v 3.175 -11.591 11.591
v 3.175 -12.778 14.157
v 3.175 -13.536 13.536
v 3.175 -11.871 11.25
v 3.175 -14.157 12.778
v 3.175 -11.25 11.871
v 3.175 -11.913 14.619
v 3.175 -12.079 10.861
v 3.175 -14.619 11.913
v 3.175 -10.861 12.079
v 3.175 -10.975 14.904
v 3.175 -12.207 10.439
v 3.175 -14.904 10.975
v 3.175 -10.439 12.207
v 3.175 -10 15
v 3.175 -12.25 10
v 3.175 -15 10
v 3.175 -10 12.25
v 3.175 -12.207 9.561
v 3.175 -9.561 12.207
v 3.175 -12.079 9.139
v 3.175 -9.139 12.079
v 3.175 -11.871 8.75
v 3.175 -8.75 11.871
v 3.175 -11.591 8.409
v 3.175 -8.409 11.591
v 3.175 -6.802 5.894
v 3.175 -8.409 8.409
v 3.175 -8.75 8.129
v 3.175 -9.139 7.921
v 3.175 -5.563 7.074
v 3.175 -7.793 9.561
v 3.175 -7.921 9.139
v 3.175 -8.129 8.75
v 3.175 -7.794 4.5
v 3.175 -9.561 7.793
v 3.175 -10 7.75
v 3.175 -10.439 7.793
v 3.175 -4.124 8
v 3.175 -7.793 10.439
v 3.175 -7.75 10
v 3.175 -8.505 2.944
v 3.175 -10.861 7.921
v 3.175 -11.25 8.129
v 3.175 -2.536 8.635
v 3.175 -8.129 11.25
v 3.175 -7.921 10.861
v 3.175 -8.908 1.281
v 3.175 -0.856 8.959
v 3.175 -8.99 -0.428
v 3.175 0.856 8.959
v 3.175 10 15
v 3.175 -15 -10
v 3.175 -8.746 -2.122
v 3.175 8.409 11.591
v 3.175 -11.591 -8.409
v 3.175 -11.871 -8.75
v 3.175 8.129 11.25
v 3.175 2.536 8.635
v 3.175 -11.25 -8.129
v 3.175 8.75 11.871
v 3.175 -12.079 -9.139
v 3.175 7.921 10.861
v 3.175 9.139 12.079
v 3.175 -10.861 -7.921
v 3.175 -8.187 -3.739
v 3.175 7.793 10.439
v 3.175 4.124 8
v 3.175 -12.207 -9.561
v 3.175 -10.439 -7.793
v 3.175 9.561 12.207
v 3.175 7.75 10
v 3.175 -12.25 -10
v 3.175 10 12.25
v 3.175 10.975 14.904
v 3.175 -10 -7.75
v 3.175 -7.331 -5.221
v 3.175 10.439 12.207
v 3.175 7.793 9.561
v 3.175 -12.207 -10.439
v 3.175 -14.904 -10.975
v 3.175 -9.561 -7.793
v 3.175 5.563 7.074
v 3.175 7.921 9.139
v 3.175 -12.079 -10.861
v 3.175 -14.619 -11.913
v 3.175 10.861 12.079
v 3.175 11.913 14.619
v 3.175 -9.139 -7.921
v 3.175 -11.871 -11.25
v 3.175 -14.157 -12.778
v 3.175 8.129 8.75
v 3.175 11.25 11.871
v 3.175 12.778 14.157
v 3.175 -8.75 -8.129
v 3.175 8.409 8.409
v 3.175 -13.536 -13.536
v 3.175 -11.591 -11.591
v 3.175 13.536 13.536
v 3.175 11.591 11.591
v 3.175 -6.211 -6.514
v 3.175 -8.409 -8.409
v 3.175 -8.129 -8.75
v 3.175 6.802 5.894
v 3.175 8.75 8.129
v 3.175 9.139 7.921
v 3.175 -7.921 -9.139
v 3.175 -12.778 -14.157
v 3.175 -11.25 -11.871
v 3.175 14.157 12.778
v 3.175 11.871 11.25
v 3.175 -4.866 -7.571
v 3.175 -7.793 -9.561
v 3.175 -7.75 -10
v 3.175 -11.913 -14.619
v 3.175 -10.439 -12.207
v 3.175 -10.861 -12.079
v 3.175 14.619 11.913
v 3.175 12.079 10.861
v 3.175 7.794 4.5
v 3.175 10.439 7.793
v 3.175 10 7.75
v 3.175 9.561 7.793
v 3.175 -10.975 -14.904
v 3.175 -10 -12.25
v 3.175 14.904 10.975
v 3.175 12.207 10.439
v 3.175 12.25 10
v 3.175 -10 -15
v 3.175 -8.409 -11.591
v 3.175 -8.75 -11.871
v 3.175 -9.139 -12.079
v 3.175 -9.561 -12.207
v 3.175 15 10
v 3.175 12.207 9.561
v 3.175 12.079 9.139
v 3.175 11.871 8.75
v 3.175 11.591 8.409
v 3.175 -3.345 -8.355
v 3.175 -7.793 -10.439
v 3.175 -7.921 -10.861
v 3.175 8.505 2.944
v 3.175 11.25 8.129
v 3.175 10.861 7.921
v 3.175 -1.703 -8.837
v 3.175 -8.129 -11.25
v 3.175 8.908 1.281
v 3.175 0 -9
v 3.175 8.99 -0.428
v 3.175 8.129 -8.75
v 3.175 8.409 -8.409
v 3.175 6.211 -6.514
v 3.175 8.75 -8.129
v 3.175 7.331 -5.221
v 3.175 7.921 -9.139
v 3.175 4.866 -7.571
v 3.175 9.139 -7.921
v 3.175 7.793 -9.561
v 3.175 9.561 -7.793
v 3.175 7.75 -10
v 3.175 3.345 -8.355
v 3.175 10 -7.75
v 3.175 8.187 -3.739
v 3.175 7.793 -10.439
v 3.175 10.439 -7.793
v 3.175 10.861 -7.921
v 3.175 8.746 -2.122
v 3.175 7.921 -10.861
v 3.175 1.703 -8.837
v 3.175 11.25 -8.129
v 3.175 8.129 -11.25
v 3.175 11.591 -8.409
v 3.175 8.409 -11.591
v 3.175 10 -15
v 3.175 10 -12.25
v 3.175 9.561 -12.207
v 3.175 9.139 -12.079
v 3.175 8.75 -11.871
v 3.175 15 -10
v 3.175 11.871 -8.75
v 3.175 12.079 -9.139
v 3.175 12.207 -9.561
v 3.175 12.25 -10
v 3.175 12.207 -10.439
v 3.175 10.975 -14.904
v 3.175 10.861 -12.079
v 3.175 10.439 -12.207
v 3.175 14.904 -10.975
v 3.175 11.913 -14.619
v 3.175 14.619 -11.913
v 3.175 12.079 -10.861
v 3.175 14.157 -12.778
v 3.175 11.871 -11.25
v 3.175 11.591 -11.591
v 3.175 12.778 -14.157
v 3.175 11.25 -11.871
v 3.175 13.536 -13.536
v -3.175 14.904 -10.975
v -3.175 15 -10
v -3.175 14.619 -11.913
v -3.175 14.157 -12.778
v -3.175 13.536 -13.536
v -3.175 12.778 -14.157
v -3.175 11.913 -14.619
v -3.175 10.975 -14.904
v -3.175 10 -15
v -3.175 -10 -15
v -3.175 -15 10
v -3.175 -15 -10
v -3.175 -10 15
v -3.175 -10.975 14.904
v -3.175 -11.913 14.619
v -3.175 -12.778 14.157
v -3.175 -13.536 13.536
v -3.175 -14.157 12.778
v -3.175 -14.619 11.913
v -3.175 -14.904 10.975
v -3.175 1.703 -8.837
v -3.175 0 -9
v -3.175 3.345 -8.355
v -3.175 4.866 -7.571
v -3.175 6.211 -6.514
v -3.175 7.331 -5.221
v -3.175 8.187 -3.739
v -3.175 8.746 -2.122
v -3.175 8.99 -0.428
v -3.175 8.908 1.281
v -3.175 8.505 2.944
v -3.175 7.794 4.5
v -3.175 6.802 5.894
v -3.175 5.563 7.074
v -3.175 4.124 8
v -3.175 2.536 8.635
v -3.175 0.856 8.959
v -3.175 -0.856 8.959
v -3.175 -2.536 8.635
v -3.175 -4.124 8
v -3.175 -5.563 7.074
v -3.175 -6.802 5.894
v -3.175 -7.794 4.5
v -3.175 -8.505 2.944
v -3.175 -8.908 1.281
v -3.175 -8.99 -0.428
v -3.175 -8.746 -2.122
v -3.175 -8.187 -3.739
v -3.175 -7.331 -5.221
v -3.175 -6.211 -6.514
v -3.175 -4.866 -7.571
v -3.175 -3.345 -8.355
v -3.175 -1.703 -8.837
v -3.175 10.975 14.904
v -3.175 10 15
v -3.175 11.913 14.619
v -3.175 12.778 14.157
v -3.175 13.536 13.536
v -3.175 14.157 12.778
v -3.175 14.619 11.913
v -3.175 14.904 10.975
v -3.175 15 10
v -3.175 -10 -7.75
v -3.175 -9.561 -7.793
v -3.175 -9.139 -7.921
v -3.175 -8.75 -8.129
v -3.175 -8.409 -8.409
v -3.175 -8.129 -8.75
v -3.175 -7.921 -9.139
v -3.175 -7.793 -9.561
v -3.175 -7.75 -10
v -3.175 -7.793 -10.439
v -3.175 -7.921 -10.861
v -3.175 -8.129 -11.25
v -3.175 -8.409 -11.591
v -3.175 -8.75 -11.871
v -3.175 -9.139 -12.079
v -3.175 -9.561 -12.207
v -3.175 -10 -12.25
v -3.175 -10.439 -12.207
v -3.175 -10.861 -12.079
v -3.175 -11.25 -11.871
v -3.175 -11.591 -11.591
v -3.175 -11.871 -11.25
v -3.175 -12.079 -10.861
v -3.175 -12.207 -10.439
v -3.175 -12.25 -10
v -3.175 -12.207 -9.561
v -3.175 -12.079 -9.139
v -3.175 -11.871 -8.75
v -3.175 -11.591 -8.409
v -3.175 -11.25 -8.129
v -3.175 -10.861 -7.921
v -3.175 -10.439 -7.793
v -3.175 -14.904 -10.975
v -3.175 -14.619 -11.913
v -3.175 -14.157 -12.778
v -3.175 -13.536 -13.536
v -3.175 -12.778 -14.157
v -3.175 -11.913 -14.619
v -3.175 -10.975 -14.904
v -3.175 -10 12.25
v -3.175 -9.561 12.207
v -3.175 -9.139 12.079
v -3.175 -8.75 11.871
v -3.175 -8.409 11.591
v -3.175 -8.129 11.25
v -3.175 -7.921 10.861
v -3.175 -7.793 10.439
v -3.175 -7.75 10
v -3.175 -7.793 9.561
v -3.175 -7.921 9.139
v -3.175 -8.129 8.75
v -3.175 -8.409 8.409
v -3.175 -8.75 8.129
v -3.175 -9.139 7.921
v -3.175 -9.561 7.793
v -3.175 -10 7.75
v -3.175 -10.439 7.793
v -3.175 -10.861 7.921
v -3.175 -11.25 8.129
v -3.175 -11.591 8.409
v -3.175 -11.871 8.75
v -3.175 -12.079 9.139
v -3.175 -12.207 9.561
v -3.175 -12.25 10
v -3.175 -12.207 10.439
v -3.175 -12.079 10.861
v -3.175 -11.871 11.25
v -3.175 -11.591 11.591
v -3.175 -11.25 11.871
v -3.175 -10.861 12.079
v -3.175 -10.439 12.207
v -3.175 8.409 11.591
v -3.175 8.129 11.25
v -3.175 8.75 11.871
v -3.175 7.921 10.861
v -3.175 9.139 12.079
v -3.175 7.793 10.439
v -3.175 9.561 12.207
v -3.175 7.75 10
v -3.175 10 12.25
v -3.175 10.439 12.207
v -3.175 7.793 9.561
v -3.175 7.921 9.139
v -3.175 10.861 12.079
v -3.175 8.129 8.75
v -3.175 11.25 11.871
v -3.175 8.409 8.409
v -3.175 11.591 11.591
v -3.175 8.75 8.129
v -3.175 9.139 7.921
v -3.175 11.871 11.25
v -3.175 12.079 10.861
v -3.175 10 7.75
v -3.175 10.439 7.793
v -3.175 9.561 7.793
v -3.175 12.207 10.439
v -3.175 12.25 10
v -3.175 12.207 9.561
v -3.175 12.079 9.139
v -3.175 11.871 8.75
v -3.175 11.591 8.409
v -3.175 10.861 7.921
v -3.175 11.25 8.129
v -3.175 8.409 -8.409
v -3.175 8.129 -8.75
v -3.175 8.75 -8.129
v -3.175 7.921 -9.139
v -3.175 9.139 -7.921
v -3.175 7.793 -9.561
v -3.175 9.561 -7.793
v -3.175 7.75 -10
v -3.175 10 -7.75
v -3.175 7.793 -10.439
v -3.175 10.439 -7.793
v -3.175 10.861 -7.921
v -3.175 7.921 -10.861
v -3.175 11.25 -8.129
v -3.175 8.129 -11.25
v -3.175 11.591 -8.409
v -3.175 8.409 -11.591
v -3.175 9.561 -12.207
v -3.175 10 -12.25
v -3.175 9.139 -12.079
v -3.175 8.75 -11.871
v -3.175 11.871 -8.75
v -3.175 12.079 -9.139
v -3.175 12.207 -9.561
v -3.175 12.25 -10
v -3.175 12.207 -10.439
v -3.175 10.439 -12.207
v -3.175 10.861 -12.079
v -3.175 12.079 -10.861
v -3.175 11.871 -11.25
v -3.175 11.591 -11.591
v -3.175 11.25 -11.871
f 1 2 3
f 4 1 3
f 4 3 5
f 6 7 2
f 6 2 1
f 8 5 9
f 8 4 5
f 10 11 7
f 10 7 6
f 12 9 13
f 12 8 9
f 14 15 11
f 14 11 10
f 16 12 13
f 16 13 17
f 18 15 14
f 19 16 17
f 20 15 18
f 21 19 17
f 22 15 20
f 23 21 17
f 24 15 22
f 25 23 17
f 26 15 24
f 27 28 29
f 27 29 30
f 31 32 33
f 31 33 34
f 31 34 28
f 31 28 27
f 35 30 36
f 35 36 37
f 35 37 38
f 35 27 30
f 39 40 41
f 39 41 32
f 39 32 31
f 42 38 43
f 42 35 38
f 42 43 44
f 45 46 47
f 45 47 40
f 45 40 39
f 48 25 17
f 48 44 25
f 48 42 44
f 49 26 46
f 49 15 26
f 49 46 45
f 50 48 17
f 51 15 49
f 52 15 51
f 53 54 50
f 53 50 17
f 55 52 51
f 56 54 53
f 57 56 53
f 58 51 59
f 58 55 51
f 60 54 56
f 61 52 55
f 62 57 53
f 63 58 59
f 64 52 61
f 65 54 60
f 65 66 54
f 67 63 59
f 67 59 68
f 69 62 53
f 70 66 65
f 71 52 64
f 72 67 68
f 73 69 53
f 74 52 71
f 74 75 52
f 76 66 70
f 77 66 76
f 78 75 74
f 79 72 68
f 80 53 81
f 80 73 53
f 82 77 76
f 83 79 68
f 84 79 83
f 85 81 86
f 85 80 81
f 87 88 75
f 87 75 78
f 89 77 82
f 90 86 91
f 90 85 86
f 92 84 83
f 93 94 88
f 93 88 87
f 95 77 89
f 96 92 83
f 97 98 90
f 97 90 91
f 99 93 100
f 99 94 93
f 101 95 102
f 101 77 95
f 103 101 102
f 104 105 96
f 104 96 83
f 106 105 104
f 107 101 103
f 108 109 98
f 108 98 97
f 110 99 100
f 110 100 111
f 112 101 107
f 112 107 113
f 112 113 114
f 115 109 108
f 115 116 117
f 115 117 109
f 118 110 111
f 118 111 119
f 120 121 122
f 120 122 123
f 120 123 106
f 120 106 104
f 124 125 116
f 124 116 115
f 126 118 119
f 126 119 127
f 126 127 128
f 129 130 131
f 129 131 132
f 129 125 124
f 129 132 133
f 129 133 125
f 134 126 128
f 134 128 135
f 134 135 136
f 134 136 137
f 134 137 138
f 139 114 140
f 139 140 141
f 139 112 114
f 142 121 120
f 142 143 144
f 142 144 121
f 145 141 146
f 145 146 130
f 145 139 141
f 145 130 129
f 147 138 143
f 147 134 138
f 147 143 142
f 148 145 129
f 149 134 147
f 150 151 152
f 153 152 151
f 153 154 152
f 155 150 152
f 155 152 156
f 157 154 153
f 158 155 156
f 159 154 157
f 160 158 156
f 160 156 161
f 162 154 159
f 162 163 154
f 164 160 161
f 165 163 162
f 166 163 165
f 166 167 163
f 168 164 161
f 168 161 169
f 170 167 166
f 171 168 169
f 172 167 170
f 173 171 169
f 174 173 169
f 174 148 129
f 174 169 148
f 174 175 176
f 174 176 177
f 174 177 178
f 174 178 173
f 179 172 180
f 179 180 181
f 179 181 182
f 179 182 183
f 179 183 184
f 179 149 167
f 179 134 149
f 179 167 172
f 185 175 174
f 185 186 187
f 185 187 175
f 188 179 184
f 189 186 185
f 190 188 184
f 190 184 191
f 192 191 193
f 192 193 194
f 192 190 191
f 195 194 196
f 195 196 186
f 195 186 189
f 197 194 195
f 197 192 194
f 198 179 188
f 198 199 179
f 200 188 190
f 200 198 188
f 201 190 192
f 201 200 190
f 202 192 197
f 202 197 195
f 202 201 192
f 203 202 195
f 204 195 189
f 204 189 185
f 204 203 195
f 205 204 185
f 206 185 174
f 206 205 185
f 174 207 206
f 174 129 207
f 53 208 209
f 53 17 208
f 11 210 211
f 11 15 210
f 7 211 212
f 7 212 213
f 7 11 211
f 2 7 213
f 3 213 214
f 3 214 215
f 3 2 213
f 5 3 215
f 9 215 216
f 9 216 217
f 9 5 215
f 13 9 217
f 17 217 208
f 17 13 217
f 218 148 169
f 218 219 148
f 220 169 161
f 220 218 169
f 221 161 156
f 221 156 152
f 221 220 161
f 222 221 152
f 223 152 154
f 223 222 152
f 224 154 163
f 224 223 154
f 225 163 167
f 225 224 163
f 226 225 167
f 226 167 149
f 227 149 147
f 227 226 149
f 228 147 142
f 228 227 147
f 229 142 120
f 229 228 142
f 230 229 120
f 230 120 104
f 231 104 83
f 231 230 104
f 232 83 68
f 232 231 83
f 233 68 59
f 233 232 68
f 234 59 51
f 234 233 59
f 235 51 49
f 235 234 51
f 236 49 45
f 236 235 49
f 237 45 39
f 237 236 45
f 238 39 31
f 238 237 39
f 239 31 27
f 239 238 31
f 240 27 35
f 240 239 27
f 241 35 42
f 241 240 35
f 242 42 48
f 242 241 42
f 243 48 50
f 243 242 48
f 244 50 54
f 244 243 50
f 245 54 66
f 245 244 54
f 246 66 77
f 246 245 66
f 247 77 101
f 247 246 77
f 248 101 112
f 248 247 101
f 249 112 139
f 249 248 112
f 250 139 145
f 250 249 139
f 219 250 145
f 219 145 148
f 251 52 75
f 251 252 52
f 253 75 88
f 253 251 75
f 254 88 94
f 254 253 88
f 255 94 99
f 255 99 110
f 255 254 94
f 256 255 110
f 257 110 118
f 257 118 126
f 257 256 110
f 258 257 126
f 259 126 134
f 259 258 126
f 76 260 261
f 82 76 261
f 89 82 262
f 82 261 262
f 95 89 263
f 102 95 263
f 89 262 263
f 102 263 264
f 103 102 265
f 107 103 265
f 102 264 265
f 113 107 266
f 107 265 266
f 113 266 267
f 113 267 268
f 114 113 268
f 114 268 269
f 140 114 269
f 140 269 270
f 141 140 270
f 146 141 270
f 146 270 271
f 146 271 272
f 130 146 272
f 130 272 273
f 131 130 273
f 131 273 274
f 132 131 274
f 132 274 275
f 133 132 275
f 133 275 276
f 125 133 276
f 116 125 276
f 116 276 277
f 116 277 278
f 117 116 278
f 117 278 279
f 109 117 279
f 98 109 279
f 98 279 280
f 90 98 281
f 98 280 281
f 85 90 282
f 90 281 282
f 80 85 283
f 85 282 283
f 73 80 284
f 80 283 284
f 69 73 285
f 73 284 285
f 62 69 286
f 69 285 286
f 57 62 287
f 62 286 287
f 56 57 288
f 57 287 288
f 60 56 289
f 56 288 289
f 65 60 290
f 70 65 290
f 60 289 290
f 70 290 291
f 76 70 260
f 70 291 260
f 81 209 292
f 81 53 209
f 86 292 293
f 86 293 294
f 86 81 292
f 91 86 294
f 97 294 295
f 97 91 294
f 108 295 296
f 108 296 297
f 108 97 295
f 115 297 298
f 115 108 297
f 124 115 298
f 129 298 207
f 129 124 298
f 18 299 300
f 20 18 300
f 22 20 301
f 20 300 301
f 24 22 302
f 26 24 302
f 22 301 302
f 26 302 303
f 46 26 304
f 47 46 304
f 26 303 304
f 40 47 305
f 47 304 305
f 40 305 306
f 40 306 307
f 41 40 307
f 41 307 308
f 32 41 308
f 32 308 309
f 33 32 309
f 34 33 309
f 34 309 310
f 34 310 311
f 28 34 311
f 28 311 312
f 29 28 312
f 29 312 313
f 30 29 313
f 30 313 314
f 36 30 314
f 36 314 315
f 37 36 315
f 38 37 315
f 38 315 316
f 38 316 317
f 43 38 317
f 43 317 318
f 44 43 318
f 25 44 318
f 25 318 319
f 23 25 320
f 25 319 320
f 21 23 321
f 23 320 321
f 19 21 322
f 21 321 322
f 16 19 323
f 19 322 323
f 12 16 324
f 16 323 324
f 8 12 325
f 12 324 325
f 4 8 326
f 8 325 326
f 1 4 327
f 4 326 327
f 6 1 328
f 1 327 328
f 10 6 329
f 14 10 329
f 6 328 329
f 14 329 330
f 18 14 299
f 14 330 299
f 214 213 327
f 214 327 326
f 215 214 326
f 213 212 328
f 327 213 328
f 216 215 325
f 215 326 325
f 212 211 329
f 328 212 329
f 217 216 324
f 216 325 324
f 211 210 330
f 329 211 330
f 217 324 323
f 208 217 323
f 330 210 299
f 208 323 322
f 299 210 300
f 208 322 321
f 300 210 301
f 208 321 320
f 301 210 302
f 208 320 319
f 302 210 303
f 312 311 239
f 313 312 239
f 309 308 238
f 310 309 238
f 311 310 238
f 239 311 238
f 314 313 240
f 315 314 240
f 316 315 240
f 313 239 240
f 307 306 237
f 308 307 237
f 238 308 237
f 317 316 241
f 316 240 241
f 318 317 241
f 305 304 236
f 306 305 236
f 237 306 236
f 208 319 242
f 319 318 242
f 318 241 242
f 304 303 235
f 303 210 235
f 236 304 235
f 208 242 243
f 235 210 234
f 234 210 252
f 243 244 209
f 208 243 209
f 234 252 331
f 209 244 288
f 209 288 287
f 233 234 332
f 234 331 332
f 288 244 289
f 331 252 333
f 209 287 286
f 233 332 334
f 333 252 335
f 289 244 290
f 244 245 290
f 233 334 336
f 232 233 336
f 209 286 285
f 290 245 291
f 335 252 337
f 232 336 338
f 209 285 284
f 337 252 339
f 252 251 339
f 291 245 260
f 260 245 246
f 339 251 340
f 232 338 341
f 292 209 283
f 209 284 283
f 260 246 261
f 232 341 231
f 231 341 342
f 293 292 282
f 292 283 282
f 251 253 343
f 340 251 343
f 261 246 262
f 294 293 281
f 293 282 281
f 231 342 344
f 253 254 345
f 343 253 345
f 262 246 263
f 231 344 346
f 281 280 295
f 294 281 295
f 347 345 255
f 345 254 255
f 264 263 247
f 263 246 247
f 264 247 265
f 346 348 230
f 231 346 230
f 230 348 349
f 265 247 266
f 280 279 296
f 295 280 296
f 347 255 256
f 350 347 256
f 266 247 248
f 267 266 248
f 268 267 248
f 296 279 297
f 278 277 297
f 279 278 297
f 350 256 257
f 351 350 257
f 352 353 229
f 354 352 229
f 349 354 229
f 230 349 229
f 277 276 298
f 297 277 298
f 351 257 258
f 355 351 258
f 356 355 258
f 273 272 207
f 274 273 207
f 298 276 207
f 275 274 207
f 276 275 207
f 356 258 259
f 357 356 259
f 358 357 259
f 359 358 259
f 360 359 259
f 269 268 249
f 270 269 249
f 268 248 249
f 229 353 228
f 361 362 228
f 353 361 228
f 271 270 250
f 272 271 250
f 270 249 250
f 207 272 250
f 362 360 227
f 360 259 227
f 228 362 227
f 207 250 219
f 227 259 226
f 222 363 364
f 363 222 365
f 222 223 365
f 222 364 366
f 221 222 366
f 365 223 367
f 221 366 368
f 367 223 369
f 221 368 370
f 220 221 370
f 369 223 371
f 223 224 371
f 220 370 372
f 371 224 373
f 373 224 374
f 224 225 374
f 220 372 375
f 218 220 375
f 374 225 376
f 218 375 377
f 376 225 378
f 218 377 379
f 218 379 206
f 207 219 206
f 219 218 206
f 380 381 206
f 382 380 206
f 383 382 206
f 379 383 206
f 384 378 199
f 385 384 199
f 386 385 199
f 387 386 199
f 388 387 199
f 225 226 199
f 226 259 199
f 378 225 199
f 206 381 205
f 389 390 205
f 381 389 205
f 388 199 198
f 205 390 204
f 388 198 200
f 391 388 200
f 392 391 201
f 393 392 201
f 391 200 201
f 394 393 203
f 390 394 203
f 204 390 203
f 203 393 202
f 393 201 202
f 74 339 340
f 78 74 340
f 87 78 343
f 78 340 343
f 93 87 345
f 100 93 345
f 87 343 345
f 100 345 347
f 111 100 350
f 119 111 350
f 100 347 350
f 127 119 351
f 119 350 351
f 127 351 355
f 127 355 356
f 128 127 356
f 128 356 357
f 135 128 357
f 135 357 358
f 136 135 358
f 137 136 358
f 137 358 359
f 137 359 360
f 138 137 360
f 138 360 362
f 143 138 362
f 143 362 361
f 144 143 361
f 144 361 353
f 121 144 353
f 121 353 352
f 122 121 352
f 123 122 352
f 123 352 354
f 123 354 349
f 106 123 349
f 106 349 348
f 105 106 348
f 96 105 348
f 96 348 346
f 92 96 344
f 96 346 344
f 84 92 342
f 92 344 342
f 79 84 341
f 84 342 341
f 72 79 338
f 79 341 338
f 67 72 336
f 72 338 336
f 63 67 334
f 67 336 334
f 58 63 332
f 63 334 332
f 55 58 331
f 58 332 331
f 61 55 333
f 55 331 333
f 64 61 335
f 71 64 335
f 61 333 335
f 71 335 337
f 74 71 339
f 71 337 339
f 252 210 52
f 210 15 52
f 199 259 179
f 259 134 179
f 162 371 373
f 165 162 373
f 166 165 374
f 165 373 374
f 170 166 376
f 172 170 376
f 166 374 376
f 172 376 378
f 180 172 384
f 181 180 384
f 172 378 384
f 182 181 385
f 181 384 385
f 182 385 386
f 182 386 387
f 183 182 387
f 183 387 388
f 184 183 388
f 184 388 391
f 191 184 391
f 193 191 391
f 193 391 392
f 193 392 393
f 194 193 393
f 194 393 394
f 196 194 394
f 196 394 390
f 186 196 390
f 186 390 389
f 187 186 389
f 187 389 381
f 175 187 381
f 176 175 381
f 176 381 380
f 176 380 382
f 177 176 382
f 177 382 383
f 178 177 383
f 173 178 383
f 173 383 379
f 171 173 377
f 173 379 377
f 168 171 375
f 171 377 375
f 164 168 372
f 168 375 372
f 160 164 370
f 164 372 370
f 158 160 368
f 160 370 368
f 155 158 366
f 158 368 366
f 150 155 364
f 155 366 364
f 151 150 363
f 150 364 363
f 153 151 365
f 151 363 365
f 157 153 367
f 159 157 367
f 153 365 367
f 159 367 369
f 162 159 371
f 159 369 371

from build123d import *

# Parameters (mm, degrees)
CROQUIS1_W                   = 30
CROQUIS1_H                   = 30
CROQUIS1_R                   = 9
SALIENTE_EXTRUIR1_DEPTH      = 3.175
TALADRO_DE_MARGEN_PARA_M41_D = 4.5
REDONDEO1_R                  = 5


with BuildPart() as part:
    # Croquis1 → Saliente-Extruir1 (new, symmetric)
    with BuildSketch(Plane(origin=(0, 0, 0), x_dir=(0, 0, -1), z_dir=(1, 0, 0))):
        Rectangle(CROQUIS1_W, CROQUIS1_H)
        Circle(CROQUIS1_R, mode=Mode.SUBTRACT)
    extrude(amount=SALIENTE_EXTRUIR1_DEPTH, both=True)

    # Taladro de margen para M41 (through all)
    with Locations(Plane(origin=(3.175, 0, 0), x_dir=(0, 0, -1), z_dir=(1, 0, 0))):
        with Locations((-10, 10), (-10, -10), (10, -10), (10, 10)):
            Hole(TALADRO_DE_MARGEN_PARA_M41_D / 2)

    # Redondeo1
    redondeo1_edges = [part.edges().sort_by_distance(p)[0] for p in [
        (0, -15, -15),
        (0, -15, 15),
        (0, 15, 15),
        (0, 15, -15),
    ]]
    fillet(redondeo1_edges, radius=REDONDEO1_R)


solid = part.part
